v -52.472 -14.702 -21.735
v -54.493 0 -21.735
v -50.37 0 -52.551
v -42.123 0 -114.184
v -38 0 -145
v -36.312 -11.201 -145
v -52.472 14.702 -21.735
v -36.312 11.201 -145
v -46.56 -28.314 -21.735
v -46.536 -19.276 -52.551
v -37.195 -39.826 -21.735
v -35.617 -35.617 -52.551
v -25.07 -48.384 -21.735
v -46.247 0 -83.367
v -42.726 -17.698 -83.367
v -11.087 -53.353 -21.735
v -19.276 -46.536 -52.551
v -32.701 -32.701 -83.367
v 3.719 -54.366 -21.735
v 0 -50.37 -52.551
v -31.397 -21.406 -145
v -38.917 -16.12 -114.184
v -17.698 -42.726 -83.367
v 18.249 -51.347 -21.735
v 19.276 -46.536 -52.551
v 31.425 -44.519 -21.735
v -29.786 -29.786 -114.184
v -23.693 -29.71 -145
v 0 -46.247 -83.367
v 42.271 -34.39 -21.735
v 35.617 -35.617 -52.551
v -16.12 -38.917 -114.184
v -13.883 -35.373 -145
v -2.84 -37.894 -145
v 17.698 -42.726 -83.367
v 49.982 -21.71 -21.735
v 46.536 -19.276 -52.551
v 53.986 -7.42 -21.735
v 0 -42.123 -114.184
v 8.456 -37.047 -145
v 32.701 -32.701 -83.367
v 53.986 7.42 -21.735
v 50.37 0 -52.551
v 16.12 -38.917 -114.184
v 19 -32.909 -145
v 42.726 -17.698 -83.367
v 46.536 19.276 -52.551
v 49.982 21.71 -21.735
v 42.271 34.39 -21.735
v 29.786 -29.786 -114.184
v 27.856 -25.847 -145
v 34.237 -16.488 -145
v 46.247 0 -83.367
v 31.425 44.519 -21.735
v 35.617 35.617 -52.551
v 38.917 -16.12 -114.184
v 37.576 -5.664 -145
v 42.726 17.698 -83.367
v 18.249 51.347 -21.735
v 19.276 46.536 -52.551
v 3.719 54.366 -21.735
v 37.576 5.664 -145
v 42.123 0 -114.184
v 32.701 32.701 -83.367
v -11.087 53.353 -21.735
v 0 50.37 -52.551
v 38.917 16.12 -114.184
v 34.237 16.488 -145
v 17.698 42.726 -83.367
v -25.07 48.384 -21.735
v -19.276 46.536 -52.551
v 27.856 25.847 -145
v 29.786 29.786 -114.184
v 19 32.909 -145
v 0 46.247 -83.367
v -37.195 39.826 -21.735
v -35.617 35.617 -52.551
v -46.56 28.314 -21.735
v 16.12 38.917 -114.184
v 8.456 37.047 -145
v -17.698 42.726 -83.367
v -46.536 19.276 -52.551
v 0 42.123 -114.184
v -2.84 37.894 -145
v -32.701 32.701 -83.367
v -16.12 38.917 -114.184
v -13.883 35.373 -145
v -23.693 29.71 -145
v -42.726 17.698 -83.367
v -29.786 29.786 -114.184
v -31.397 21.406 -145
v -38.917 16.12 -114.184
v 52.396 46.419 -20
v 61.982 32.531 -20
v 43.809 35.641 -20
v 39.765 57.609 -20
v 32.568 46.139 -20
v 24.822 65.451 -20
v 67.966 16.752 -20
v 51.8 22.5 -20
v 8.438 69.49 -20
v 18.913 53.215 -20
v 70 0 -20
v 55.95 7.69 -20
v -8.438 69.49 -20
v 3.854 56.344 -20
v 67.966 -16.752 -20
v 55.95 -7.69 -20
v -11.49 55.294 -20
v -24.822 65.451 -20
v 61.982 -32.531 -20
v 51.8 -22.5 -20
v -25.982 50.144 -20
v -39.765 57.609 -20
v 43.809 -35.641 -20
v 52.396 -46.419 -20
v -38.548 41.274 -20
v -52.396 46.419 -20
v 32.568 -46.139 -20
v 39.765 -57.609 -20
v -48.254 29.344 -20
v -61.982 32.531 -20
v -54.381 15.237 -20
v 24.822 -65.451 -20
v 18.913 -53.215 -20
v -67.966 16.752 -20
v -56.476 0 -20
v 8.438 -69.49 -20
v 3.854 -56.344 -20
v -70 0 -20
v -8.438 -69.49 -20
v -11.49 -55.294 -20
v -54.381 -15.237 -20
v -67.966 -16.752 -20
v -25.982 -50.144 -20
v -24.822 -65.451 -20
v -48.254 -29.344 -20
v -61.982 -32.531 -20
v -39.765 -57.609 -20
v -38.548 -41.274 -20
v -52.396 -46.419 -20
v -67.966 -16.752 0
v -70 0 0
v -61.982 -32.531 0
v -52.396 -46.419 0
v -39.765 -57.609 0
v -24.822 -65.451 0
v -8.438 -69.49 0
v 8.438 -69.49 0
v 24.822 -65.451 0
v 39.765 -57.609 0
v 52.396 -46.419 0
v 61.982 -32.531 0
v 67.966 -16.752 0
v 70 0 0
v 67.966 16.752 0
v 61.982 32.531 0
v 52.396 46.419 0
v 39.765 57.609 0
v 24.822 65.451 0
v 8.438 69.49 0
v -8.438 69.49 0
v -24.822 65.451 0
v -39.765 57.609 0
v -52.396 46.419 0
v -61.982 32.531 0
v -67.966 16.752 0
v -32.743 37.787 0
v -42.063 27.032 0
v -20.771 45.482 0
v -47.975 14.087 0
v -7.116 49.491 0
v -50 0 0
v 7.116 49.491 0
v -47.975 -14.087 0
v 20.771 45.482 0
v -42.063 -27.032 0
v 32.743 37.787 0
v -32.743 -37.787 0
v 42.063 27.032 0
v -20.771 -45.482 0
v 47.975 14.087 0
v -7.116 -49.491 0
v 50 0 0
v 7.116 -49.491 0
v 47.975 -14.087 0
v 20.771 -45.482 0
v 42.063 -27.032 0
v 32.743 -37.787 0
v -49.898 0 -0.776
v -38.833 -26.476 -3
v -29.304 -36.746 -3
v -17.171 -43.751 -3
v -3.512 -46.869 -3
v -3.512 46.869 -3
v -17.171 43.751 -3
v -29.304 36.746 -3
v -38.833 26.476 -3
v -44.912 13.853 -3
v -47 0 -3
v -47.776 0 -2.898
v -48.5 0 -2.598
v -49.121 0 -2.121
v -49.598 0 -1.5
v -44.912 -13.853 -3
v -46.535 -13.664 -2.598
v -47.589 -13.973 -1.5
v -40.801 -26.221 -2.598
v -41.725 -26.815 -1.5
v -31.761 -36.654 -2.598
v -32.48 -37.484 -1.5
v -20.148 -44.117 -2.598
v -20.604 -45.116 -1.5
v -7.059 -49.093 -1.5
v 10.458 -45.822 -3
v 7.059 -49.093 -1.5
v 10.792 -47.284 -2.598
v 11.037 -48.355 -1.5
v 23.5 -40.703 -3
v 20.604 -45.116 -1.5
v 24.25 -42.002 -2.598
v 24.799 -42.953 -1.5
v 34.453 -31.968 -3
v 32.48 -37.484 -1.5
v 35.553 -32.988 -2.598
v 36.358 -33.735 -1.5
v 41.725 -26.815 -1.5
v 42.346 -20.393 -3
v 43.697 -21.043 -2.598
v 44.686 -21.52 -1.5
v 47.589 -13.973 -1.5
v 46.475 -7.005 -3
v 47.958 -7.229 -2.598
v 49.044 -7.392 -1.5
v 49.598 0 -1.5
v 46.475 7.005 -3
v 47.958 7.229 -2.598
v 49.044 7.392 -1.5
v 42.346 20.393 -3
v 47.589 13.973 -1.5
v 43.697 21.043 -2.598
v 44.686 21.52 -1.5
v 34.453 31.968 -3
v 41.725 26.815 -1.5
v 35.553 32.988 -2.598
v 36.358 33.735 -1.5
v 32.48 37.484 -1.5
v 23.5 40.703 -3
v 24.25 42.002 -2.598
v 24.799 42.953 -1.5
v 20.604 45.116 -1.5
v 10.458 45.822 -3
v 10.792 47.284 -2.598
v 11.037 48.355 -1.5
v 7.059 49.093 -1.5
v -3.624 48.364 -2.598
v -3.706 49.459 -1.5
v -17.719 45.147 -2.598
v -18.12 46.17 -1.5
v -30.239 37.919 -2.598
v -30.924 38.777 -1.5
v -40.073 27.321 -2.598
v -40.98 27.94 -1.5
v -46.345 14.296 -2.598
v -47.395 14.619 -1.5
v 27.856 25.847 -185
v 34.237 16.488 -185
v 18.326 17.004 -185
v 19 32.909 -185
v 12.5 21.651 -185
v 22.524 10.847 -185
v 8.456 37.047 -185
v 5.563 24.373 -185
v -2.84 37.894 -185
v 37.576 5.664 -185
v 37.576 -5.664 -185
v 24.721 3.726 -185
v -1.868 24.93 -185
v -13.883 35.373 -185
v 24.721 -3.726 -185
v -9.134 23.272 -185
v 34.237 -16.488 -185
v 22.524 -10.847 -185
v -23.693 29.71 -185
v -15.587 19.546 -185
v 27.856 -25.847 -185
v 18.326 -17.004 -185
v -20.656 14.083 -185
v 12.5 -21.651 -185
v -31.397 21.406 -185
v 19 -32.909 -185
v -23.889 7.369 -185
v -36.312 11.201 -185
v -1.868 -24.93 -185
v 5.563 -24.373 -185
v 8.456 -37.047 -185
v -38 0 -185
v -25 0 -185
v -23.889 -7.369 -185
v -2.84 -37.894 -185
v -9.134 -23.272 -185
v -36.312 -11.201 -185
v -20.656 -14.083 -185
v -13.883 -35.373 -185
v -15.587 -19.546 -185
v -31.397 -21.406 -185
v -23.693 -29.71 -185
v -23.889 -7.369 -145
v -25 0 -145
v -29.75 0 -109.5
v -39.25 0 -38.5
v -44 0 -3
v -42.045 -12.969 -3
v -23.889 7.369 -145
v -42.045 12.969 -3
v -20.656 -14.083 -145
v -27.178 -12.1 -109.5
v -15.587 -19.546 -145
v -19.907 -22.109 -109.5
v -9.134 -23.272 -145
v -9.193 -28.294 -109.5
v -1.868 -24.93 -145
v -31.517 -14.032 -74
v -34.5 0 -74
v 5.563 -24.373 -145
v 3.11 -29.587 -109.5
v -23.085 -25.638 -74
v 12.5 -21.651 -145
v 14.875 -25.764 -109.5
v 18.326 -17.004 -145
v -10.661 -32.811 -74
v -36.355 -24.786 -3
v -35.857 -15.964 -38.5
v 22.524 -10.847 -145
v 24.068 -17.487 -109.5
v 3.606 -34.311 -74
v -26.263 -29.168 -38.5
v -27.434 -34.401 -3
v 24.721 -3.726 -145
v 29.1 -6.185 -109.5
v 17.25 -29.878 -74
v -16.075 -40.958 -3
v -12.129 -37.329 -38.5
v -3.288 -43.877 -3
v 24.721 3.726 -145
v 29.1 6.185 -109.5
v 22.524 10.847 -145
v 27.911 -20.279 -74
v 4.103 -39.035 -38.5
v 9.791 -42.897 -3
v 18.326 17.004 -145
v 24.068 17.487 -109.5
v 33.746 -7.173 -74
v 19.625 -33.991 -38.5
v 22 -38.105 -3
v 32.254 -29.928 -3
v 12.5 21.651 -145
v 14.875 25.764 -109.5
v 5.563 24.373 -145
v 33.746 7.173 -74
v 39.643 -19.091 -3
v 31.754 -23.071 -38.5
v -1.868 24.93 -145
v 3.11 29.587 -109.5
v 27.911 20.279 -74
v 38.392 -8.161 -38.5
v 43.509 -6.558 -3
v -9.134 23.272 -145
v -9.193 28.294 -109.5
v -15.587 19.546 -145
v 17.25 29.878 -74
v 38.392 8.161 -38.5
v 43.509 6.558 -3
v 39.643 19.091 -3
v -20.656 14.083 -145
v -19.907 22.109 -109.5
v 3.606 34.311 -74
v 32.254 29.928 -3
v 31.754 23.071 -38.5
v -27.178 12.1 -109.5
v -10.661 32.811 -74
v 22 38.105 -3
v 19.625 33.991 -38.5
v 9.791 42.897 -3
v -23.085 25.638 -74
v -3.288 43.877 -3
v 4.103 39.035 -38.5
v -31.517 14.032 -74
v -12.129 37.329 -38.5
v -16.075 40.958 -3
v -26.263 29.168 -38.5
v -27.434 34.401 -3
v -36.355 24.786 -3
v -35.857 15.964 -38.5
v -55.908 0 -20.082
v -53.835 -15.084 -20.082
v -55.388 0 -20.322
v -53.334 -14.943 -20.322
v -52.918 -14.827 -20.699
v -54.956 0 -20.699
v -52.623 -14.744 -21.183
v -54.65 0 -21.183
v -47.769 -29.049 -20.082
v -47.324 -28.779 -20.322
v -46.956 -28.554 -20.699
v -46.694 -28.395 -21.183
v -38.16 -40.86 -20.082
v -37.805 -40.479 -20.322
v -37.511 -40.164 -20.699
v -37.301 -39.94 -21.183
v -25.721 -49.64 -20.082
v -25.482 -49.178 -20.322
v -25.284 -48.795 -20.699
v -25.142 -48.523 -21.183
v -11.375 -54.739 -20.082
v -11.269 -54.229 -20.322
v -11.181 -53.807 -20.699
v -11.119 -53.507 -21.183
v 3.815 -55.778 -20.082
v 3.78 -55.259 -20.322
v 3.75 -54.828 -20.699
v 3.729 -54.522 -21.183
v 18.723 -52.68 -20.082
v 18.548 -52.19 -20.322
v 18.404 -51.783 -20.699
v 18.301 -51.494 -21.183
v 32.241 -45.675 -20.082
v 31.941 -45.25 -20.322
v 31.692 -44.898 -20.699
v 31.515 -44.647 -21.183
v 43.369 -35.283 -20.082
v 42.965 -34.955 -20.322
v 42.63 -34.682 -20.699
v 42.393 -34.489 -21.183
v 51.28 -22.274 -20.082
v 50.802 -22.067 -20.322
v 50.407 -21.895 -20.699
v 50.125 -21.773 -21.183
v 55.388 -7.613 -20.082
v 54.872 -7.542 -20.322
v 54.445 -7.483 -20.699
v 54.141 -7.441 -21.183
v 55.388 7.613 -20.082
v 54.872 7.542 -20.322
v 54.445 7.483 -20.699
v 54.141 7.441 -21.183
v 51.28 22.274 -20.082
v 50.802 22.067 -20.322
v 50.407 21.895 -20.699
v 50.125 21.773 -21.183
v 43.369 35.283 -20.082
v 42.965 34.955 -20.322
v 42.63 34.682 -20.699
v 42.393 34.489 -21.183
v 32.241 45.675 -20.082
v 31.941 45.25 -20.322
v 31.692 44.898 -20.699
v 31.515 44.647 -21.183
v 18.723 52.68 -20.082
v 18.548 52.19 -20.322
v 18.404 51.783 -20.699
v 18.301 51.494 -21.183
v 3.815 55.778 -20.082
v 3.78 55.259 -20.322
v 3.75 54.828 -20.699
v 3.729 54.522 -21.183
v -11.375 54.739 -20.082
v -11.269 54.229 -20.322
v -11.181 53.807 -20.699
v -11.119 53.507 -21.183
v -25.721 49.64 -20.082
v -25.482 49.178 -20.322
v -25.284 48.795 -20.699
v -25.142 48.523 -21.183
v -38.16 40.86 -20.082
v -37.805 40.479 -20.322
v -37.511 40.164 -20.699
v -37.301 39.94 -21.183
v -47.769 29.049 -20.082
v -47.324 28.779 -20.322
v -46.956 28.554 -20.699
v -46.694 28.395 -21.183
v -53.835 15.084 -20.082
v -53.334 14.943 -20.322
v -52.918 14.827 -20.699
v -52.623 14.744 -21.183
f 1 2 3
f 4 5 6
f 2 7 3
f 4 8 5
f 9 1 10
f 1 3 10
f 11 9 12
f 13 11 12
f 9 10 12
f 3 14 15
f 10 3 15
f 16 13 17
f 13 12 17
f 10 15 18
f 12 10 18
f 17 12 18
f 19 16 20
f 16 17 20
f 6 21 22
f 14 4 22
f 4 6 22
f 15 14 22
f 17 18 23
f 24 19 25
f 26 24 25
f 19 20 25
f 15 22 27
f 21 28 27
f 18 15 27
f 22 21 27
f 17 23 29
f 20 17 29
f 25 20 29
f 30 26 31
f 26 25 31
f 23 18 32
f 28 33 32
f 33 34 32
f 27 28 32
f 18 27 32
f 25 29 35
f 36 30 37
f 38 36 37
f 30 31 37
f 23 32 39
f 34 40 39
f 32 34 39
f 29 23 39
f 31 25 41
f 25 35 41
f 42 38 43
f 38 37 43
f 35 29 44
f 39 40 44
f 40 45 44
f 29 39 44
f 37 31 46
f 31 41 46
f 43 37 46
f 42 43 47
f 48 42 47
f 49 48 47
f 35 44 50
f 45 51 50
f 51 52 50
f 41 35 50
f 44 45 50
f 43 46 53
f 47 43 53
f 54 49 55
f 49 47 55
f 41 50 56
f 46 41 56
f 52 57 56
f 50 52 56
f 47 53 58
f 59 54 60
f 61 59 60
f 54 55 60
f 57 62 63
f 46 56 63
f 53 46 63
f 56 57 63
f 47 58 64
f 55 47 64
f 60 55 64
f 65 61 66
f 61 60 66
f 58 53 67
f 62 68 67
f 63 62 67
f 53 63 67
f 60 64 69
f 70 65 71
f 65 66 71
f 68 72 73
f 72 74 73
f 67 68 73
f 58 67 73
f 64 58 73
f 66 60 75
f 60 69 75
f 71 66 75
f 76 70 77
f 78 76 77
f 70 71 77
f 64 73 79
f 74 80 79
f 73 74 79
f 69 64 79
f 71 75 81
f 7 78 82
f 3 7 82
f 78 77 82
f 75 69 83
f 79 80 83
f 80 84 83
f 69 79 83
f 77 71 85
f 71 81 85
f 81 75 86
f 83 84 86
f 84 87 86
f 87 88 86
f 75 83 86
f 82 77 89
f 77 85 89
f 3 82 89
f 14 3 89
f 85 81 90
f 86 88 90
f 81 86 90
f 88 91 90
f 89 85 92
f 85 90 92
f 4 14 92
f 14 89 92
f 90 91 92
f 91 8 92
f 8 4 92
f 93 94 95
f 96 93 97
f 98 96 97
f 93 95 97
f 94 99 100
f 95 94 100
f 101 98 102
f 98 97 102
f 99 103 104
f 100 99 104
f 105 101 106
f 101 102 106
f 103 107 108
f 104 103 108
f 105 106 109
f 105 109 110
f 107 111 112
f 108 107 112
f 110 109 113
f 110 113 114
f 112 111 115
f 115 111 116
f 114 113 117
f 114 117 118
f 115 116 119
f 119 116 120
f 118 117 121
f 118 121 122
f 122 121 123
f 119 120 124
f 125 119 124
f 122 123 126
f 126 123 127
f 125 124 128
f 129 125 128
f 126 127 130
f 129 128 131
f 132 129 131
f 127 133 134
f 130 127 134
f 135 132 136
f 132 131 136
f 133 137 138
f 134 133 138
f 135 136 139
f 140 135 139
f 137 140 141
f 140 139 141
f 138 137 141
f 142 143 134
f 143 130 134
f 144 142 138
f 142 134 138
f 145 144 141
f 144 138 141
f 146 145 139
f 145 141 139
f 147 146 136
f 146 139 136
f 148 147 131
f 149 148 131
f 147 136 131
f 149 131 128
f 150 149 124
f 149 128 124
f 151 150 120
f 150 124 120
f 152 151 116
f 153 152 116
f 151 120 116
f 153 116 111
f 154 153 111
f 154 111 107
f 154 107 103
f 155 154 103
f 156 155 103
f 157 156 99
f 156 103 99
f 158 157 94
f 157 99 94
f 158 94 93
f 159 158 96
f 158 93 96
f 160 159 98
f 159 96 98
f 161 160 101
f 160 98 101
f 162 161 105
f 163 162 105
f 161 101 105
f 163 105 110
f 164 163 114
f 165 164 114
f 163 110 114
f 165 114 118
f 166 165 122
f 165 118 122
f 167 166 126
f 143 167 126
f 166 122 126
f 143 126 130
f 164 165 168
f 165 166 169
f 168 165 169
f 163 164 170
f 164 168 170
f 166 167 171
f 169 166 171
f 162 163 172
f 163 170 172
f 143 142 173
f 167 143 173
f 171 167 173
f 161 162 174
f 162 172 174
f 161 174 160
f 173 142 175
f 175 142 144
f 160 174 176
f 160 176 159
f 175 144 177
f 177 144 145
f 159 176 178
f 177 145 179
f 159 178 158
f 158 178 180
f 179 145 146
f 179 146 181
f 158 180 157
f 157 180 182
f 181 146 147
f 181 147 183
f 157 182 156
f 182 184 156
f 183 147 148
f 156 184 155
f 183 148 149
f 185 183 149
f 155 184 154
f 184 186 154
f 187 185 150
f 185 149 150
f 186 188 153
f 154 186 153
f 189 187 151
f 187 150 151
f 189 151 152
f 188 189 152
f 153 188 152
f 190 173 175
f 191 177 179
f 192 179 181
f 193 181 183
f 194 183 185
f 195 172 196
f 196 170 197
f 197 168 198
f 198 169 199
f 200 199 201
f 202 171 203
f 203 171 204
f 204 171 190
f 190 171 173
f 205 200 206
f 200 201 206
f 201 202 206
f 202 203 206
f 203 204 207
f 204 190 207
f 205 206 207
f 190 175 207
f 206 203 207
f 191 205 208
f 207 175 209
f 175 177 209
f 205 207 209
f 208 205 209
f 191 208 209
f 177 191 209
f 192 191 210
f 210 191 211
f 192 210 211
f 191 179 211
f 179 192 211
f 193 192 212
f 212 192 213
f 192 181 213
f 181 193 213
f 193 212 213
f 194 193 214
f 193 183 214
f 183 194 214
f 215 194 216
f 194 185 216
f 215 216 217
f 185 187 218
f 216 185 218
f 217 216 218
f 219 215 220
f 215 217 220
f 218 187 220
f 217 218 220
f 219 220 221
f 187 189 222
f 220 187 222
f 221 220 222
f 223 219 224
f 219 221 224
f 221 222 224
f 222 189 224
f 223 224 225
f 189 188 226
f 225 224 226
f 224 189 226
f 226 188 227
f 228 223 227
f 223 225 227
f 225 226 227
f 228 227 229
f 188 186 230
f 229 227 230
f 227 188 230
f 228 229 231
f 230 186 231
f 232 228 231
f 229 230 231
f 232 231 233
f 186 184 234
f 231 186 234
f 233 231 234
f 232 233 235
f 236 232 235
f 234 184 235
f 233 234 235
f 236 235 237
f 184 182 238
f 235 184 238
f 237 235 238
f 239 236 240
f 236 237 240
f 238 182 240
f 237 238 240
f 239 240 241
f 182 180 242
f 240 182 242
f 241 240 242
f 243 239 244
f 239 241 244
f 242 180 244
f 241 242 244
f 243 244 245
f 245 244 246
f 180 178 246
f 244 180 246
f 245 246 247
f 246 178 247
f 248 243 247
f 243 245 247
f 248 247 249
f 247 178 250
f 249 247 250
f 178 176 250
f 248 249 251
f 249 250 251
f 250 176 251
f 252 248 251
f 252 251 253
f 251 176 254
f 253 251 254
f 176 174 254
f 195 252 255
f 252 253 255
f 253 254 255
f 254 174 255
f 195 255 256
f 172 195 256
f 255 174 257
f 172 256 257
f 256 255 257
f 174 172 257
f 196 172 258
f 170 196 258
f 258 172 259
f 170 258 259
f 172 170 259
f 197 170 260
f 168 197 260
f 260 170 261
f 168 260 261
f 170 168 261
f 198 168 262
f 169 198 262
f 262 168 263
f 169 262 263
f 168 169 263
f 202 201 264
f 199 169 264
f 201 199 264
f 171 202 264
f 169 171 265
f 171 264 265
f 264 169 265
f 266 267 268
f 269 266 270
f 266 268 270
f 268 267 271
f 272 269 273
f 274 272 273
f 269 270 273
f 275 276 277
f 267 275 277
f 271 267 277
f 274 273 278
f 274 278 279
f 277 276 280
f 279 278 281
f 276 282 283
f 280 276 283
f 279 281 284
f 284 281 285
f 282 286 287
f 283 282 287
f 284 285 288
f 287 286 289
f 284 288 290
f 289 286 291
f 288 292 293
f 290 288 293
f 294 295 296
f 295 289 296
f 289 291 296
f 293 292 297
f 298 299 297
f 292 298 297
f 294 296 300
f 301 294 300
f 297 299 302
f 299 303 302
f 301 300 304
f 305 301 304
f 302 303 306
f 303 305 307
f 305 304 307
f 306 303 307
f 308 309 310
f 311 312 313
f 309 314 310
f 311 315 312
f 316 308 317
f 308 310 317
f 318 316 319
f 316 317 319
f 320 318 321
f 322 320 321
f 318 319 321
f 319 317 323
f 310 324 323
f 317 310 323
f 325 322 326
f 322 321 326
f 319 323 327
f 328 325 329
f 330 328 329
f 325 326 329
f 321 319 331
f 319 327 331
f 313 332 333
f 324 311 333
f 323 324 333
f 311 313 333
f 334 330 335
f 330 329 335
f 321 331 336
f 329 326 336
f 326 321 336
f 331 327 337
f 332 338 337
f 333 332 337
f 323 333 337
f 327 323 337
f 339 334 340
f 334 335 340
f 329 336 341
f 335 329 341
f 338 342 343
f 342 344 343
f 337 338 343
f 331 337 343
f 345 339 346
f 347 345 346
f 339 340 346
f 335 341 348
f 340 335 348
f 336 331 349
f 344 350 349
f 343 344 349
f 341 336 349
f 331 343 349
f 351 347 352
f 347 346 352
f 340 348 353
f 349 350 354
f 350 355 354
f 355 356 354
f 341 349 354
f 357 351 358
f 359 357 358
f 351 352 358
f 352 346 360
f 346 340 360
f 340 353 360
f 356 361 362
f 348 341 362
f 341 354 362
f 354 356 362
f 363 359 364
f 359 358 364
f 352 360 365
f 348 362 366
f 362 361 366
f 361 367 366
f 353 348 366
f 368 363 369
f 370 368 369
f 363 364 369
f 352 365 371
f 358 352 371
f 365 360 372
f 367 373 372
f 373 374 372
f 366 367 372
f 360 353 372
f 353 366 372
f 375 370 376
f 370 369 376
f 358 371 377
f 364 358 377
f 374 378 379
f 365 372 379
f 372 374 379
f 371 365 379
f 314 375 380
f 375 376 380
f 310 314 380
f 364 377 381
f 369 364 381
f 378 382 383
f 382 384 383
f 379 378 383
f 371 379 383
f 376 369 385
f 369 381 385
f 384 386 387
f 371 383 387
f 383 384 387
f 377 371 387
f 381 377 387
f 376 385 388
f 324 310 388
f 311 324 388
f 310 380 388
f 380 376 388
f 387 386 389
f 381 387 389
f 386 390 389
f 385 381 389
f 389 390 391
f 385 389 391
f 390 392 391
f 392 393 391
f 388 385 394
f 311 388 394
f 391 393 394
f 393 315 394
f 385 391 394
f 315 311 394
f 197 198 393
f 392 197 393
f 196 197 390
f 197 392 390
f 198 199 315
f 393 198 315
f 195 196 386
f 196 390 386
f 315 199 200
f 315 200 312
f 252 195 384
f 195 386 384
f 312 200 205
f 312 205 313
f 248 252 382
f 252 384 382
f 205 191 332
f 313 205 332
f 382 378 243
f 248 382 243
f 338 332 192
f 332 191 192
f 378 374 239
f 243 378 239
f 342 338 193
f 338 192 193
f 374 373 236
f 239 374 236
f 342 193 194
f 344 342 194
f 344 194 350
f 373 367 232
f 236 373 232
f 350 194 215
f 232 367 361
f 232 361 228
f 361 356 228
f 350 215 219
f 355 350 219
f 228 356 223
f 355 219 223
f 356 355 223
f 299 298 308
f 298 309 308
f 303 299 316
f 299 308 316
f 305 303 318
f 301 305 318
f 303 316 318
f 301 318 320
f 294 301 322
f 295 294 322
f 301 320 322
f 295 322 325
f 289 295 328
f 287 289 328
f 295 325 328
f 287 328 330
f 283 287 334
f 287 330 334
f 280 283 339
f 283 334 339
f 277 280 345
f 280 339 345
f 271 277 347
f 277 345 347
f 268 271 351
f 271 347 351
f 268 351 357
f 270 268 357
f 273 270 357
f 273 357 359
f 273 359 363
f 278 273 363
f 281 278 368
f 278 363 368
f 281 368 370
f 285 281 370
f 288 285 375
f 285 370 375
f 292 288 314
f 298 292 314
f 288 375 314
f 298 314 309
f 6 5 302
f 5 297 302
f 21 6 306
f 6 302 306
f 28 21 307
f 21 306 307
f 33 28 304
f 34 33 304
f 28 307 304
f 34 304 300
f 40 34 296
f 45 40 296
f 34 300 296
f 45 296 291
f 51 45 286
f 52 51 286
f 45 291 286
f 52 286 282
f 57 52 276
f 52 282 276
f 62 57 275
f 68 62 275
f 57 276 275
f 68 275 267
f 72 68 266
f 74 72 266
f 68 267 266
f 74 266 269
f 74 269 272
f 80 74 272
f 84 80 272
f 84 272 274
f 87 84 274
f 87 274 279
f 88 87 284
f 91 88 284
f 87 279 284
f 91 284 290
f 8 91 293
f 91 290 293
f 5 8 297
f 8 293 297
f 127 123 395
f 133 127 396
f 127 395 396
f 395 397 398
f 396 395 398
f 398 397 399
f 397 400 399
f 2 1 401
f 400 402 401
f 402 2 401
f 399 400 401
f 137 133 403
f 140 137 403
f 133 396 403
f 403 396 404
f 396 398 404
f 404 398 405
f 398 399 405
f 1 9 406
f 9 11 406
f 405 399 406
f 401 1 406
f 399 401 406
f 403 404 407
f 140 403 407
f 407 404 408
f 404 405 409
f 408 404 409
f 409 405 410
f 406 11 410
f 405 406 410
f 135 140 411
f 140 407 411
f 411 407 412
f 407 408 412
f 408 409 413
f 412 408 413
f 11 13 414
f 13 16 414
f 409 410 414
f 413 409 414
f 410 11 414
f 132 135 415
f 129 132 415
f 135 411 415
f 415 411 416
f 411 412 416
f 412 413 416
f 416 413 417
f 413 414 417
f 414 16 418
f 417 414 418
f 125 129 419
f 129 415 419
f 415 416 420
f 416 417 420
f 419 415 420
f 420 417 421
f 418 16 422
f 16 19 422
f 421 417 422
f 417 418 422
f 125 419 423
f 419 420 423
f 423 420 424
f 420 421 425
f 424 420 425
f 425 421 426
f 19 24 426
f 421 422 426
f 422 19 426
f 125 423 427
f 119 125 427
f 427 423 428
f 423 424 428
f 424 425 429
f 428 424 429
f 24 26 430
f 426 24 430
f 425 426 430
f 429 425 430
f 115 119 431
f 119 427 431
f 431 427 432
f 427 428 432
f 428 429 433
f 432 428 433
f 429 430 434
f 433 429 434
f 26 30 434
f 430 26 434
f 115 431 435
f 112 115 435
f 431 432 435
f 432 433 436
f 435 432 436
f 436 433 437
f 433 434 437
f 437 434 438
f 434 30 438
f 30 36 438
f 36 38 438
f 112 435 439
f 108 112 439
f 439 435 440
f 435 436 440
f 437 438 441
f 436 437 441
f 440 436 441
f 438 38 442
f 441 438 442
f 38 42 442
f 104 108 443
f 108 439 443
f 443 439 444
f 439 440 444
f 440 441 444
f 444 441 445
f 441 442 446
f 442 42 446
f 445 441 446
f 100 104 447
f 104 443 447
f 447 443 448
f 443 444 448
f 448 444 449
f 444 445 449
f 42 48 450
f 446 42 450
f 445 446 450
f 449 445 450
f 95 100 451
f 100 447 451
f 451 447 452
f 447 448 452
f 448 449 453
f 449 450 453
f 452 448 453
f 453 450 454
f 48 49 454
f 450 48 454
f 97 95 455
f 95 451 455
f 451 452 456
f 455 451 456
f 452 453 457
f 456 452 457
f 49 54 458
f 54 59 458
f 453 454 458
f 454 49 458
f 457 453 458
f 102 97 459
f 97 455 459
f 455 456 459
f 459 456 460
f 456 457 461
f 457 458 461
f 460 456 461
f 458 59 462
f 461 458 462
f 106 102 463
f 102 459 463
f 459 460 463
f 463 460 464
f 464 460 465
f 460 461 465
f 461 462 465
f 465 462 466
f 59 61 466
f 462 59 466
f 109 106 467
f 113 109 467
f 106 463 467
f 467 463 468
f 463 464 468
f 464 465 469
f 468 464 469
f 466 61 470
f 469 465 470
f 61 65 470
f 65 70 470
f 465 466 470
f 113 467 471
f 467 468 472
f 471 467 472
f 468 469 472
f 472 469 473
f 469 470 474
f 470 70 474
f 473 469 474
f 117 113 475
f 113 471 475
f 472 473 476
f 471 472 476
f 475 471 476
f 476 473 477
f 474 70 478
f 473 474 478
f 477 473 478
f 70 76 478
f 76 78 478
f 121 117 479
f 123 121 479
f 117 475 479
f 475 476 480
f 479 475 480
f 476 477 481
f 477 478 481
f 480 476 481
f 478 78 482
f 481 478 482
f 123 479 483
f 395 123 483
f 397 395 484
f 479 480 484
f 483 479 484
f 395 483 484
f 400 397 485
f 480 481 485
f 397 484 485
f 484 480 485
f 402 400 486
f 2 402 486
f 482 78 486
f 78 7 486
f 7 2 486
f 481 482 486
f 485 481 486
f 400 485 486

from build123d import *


with BuildPart() as part:
    # Sketch1 → Revolve1 (revolve)
    with BuildSketch(Plane(origin=(0, 0, 0), x_dir=(1, 0, 0), z_dir=(0, 1, 0)), mode=Mode.PRIVATE) as revolve1_sk:
        with BuildLine():
            Line((44, 3), (47, 3))
            ThreePointArc((47, 3), (49.121320344, 2.121320344), (50, 0))
            Line((50, 0), (70, 0))
            Line((70, 0), (70, 20))
            Line((70, 20), (56.475570251, 20))
            ThreePointArc((56.475570251, 20), (55.158468064, 20.494927966), (54.493236583, 21.734758171))
            Line((54.493236583, 21.734758171), (38, 145))
            Line((38, 145), (38, 185))
            Line((38, 185), (25, 185))
            Line((25, 185), (25, 145))
            Line((25, 145), (44, 3))
        make_face()
    revolve(revolve1_sk.sketch.rotate(Axis((0, 0, -195.705477905), (0, 0, 1)), 180), axis=Axis((0, 0, -195.705477905), (0, 0, 1)))


solid = part.part
